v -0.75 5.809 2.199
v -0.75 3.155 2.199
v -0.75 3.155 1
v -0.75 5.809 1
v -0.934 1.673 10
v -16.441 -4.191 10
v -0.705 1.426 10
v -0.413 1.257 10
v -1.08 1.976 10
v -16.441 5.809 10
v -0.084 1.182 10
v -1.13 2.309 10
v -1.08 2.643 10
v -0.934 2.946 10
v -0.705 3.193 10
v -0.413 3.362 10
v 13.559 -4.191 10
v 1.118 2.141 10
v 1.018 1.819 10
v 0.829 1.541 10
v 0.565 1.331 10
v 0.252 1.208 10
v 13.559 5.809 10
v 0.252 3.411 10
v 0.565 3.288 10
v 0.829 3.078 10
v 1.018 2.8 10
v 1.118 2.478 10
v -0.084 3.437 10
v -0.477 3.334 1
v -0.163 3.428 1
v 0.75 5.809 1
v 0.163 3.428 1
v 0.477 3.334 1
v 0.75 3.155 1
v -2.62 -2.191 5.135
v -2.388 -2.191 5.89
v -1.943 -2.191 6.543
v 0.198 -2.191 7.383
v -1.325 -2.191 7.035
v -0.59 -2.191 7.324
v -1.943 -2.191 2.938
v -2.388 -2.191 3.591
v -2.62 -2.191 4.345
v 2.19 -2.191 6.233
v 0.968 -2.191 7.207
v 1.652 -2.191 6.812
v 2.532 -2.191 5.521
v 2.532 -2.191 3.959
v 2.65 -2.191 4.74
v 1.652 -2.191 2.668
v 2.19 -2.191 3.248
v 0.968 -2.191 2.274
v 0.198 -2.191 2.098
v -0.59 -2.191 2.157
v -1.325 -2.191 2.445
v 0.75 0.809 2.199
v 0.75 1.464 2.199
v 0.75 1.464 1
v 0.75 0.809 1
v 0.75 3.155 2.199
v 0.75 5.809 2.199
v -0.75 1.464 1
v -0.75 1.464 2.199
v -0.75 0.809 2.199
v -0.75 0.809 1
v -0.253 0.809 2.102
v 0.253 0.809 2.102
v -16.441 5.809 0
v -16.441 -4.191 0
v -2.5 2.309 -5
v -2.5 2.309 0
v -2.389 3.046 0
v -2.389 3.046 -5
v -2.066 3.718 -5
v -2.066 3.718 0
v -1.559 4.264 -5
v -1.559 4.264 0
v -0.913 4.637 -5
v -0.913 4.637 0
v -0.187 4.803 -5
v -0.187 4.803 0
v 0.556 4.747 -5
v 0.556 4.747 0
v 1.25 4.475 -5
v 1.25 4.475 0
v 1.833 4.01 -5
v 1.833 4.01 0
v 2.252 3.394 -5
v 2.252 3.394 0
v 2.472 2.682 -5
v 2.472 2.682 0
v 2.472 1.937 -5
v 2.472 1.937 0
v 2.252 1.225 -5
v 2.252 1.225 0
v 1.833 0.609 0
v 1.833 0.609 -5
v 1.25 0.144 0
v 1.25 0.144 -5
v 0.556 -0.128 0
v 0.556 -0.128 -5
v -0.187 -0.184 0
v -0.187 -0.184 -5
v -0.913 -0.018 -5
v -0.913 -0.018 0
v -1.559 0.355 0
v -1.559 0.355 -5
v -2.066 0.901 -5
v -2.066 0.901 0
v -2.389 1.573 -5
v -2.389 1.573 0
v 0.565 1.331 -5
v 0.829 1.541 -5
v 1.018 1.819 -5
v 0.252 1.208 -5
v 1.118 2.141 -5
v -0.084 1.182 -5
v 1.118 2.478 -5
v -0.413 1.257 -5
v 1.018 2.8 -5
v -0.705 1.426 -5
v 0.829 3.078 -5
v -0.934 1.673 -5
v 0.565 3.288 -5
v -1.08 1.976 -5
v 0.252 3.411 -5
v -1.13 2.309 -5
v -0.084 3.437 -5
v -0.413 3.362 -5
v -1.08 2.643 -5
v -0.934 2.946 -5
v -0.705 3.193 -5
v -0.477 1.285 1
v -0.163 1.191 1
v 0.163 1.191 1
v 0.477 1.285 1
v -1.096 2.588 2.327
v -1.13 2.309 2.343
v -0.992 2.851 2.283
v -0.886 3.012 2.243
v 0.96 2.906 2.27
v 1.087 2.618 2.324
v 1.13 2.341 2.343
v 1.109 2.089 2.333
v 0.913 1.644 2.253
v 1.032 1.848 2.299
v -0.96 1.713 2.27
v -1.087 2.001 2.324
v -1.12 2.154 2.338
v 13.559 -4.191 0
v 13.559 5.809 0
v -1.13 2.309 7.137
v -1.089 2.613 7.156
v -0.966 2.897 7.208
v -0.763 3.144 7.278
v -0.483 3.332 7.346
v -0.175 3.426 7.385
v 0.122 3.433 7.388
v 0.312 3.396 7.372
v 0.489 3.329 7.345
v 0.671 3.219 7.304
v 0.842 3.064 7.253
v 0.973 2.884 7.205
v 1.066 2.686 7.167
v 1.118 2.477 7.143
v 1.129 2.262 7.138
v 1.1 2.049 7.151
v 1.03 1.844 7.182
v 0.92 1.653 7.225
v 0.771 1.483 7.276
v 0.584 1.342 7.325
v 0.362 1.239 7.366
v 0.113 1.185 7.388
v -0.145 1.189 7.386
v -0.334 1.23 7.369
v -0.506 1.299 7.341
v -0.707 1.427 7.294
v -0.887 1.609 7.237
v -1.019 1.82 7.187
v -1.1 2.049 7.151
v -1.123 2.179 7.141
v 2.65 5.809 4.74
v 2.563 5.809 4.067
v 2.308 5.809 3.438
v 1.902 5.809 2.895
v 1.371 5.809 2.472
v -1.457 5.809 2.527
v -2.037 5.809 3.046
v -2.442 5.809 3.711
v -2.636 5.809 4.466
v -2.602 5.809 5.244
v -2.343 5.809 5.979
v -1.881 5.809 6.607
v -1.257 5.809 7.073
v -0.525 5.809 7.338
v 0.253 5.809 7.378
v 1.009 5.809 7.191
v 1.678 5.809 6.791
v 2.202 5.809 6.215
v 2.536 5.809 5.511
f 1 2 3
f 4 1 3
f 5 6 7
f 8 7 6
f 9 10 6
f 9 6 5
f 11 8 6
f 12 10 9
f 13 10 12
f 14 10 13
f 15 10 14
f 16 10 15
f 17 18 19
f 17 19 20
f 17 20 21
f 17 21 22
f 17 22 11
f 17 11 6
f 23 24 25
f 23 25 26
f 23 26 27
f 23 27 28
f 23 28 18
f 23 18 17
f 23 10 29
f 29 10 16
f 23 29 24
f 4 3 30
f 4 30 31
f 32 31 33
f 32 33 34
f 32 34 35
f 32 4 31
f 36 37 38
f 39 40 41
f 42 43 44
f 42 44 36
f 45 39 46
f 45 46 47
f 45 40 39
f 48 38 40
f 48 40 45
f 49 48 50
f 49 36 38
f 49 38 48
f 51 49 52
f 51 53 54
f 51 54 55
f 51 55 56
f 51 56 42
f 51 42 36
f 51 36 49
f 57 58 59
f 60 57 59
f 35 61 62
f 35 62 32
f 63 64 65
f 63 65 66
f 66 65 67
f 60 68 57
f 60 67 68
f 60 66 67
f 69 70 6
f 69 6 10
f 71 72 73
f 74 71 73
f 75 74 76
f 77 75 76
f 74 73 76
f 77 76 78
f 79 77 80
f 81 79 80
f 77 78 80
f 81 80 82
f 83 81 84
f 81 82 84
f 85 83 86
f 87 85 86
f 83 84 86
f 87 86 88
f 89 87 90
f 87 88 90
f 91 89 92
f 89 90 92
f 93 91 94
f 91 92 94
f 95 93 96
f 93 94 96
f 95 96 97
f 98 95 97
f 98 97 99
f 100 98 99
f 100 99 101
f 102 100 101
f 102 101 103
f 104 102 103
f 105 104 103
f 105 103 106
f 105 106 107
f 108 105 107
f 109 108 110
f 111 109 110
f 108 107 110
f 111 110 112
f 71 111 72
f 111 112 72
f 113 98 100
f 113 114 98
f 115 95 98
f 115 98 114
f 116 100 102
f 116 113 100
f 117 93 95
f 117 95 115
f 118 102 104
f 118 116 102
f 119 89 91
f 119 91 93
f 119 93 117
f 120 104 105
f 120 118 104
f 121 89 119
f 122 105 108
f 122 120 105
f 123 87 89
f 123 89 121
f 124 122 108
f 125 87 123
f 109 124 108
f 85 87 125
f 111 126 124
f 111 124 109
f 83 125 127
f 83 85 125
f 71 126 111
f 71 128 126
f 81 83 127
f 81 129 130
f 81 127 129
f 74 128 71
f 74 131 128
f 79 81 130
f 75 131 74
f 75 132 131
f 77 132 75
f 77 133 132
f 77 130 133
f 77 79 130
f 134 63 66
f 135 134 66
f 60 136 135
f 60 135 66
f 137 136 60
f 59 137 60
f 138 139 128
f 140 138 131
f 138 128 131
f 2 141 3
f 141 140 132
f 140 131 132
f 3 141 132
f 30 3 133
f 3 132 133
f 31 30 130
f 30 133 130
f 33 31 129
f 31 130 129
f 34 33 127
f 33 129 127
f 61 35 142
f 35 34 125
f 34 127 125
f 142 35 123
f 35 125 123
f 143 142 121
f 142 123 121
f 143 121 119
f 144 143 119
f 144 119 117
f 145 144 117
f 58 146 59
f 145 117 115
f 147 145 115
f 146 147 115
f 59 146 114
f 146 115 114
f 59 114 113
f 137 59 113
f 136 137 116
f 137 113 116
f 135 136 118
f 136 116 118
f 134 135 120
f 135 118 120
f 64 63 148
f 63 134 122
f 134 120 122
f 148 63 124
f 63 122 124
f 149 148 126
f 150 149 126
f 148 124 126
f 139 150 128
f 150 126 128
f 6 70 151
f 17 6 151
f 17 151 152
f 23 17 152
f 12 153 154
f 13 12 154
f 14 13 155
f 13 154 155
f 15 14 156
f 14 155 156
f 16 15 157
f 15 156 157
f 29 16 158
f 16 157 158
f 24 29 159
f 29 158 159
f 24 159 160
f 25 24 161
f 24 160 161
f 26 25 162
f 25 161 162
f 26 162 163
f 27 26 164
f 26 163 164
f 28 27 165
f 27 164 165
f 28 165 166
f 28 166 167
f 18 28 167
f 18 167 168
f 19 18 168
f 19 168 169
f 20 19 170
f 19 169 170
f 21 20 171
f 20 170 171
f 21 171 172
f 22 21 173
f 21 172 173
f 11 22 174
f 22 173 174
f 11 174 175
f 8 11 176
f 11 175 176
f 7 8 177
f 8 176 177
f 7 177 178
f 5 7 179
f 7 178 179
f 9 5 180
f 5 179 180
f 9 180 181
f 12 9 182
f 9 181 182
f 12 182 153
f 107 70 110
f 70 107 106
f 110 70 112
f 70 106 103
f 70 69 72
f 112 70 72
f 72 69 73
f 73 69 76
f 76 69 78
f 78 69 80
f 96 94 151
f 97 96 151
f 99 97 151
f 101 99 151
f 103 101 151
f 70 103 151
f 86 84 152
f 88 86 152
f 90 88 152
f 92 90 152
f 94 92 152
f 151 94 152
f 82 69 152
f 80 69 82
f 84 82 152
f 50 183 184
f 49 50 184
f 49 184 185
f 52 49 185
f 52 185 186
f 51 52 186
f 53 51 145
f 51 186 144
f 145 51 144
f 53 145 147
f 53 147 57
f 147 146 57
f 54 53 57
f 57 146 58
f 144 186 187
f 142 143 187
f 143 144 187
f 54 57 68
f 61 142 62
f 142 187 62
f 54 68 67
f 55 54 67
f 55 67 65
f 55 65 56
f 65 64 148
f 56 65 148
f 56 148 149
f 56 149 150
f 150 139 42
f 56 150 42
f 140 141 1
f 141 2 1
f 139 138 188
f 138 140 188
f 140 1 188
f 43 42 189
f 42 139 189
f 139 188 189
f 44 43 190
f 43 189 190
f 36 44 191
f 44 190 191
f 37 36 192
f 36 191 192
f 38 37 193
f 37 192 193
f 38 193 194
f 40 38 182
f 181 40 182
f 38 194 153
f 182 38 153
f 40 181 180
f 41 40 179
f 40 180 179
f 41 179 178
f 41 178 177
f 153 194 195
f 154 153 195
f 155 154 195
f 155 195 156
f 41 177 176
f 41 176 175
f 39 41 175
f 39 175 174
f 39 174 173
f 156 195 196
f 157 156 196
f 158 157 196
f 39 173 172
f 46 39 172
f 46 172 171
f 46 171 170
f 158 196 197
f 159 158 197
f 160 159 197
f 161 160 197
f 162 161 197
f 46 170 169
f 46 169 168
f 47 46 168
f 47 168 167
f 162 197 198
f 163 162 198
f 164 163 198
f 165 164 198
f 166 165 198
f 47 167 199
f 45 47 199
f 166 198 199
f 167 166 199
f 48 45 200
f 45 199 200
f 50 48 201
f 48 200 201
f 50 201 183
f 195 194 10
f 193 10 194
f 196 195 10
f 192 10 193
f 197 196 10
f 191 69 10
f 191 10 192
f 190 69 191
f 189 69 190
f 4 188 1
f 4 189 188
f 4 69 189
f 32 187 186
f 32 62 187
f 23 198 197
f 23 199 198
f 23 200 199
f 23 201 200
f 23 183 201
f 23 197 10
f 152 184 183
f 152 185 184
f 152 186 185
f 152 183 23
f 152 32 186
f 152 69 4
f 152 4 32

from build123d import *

# Parameters (mm, degrees)
SKETCH1_W                = 30
SKETCH1_H                = 10
BOSS_EXTRUDE1_DEPTH      = 10
SKETCH2_R                = 2.5
SKETCH2_R_2              = 1.1303
F_4_40_SCREW_SPACE_DEPTH = 5
SKETCH5_R                = 1.1303
CUT_EXTRUDE3_DEPTH       = 16
SKETCH3_R                = 2.65
CUT_EXTRUDE1_DEPTH       = 8
SKETCH4_W                = 1.5
SKETCH4_H                = 1.778161356
CUT_EXTRUDE2_DEPTH       = 5


with BuildPart() as part:
    # Sketch1 → Boss-Extrude1 (new body)
    with BuildSketch(Plane.XY):
        with Locations((-1.440677966, 0.809495308)):
            Rectangle(SKETCH1_W, SKETCH1_H)
    extrude(amount=BOSS_EXTRUDE1_DEPTH)

    # Sketch2 → 4-40 screw space (add)
    with BuildSketch(Plane(origin=(0, 0, 0), x_dir=(-1, 0, 0), z_dir=(0, 0, -1))):
        with Locations((0, 2.309495308)):
            Circle(SKETCH2_R)
        with Locations((0, 2.309495308)):
            Circle(SKETCH2_R_2, mode=Mode.SUBTRACT)
    extrude(amount=F_4_40_SCREW_SPACE_DEPTH)

    # Sketch5 → Cut-Extrude3 (cut, through all)
    with BuildSketch(Plane(origin=(0, 0, -5), x_dir=(-1, 0, 0), z_dir=(0, 0, -1))):
        with Locations((0, 2.309495308)):
            Circle(SKETCH5_R)
    extrude(amount=-CUT_EXTRUDE3_DEPTH, mode=Mode.SUBTRACT)

    # Sketch3 → Cut-Extrude1 (cut)
    with BuildSketch(Plane(origin=(0, 5.809495308, 0), x_dir=(1, 0, 0), z_dir=(0, 1, 0))):
        with Locations((0, -4.740342164)):
            Circle(SKETCH3_R)
    extrude(amount=-CUT_EXTRUDE1_DEPTH, mode=Mode.SUBTRACT)

    # Sketch4 → Cut-Extrude2 (cut)
    with BuildSketch(Plane(origin=(0, 5.809495308, 0), x_dir=(1, 0, 0), z_dir=(0, 1, 0))):
        with Locations((0, -1.889080678)):
            Rectangle(SKETCH4_W, SKETCH4_H)
    extrude(amount=-CUT_EXTRUDE2_DEPTH, mode=Mode.SUBTRACT)


solid = part.part
